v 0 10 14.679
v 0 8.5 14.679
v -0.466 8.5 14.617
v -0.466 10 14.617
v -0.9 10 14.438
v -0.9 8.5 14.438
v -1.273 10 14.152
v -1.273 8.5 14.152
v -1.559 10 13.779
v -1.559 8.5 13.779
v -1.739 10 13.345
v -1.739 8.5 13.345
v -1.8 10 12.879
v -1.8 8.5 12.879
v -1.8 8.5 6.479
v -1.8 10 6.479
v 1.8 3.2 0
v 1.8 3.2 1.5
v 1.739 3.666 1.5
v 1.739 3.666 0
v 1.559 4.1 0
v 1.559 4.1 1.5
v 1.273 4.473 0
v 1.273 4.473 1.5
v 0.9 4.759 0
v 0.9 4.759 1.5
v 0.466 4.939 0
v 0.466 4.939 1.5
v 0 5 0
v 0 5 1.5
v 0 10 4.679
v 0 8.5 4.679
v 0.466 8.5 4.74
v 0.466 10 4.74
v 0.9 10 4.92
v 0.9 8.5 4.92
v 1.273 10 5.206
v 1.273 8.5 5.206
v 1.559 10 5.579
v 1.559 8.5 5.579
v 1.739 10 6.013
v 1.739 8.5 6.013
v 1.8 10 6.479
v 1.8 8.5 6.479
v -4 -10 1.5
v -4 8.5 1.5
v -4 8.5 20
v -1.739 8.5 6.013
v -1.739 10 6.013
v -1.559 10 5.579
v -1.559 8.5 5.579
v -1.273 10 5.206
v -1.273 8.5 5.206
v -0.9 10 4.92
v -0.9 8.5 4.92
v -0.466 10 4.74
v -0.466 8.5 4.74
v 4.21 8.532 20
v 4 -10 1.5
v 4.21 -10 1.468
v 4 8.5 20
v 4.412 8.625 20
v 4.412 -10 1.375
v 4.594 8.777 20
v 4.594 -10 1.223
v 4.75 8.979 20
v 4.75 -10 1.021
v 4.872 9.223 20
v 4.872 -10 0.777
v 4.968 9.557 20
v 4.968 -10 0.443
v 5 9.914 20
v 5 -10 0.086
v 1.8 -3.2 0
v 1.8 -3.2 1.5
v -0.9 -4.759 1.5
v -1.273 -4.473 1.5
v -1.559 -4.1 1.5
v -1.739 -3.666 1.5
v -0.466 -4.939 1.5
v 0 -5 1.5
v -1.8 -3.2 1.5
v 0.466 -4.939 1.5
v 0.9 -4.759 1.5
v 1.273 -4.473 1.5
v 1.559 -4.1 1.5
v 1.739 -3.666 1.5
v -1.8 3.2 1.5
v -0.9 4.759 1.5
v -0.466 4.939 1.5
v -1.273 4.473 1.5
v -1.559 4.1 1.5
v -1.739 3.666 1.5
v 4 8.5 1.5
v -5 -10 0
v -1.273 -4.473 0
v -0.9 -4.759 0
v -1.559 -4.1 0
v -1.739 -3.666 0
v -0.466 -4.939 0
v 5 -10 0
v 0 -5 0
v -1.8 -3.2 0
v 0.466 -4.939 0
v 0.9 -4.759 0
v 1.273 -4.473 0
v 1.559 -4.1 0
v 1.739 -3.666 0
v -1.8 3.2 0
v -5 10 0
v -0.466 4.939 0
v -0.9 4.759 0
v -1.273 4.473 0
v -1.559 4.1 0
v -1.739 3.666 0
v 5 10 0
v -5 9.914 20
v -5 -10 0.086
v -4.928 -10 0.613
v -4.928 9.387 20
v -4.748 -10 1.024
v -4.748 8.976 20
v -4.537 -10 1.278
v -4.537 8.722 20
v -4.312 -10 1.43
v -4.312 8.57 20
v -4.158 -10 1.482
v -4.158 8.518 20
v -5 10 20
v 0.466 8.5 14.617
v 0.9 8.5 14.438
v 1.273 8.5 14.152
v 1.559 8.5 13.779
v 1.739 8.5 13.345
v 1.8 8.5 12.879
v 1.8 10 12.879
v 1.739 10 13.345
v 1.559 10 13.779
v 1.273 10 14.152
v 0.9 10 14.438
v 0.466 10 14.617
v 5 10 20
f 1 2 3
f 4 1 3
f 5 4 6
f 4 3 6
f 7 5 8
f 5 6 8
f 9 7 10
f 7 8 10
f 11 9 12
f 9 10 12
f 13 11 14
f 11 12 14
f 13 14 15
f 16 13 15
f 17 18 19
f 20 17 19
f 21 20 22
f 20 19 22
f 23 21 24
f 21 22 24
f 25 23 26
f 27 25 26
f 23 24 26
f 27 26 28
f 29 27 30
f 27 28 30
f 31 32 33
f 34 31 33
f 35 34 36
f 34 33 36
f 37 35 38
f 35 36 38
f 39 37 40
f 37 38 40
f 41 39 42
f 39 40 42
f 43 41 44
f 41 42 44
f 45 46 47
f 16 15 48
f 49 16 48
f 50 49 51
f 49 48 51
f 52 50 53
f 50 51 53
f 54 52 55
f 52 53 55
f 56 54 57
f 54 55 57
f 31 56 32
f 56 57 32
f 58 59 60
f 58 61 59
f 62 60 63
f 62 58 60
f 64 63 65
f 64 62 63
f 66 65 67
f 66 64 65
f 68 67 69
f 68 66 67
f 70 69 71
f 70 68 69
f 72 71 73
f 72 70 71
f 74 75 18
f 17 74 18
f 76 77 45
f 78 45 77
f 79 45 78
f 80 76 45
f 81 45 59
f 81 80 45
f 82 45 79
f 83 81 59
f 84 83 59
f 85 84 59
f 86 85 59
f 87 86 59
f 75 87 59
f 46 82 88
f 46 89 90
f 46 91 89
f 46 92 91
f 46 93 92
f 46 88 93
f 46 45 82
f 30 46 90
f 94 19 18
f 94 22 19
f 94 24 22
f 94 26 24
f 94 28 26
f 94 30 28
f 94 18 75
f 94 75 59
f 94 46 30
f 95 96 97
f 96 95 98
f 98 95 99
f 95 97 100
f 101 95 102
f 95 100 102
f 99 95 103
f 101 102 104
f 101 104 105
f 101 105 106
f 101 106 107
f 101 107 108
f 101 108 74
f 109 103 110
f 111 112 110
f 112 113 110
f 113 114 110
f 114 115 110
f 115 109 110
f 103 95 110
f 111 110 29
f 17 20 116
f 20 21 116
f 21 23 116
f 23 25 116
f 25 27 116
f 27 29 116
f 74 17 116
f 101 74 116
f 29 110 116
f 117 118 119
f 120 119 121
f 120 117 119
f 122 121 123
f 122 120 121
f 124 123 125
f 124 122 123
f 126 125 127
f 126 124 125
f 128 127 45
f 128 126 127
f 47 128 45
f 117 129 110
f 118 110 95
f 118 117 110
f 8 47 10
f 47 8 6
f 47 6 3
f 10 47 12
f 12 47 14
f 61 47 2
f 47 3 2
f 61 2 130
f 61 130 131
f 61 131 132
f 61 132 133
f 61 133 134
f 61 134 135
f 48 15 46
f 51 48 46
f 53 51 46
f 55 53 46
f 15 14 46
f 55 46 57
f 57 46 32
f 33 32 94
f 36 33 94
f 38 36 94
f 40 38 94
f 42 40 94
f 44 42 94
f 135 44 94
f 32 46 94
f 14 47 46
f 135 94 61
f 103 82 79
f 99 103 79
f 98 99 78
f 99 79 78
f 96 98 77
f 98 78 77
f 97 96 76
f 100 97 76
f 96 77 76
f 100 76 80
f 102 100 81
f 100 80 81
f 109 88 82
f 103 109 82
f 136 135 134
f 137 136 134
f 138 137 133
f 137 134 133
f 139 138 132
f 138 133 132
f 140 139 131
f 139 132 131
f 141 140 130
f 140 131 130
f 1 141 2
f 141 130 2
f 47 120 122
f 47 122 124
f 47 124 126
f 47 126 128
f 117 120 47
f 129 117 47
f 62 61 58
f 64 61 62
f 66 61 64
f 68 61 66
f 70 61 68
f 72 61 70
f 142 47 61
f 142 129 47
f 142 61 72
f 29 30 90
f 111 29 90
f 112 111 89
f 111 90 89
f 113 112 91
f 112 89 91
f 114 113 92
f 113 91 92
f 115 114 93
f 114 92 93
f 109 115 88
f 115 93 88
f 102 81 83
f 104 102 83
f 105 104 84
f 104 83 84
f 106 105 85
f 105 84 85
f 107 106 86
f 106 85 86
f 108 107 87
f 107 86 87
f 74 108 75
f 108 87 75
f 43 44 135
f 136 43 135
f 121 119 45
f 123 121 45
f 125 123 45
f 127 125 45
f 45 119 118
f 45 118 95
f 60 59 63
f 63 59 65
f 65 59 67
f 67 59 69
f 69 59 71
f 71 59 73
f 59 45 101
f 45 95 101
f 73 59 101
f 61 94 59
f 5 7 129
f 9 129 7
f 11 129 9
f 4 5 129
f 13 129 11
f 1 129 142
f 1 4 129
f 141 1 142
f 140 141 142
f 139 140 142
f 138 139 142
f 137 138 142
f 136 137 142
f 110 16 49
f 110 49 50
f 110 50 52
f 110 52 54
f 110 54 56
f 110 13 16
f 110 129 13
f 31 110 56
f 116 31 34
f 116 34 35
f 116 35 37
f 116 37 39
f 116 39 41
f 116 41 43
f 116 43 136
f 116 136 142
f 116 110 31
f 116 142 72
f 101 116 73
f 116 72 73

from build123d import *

# Parameters (mm, degrees)
F0_W     = 10
F0_H     = 20
F1_DEPTH = 1.5
F2_W     = 10
F2_H     = 1.5
F3_DEPTH = 18.5
F5_DEPTH = 1.501
F7_DEPTH = 1.501
F9_DEPTH = 1
F10_R    = 0.99999


# Not quite as in the source:
# - a fillet or chamfer is up to 0.001 mm smaller than in the source, because OpenCascade refuses the exact size
# - a pattern or mirror of a feature is missing from the dataset's text; its kind, count and spacing are read off the source's solid


with BuildPart() as f1:
    # F0 (on Top) → F1 (new body)
    with BuildSketch(Plane.XY):
        Rectangle(F0_W, F0_H)
    extrude(amount=F1_DEPTH)

    # F2 (on face) → F3 (join)
    with BuildSketch(Plane.XY.offset(1.5)):
        with Locations((0, 9.25)):
            Rectangle(F2_W, F2_H)
    extrude(amount=F3_DEPTH)

    # F4 (on face) → F5 (cut, through all)
    with BuildSketch(Plane.XY.offset(1.5)):
        with BuildLine():
            ThreePointArc((0, -5), (1.2727922061, -4.4727922061), (1.8, -3.2))
            Line((1.8, -3.2), (1.8, 3.2))
            ThreePointArc((1.8, 3.2), (1.2727922061, 4.4727922061), (0, 5))
            ThreePointArc((0, 5), (-1.2727922061, 4.4727922061), (-1.8, 3.2))
            Line((-1.8, 3.2), (-1.8, -3.2))
            ThreePointArc((-1.8, -3.2), (-1.2727922061, -4.4727922061), (0, -5))
        make_face()
    extrude(amount=-F5_DEPTH, mode=Mode.SUBTRACT)

    # F6 (on face) → F7 (cut, through all)
    with BuildSketch(Plane.XZ.offset(-8.5)):
        with BuildLine():
            ThreePointArc((0, 4.6788305809), (1.2727922061, 5.2060383747), (1.8, 6.4788305809))
            Line((1.8, 6.4788305809), (1.8, 12.8788305809))
            ThreePointArc((1.8, 12.8788305809), (1.2727922061, 14.151622787), (0, 14.6788305809))
            ThreePointArc((0, 14.6788305809), (-1.2727922061, 14.151622787), (-1.8, 12.8788305809))
            Line((-1.8, 12.8788305809), (-1.8, 6.4788305809))
            ThreePointArc((-1.8, 6.4788305809), (-1.2727922061, 5.2060383747), (0, 4.6788305809))
        make_face()
    extrude(amount=-F7_DEPTH, mode=Mode.SUBTRACT)

    # F8 (on face) → F9 (join)
    with BuildSketch(Plane(origin=(-5, 0, 0), x_dir=(0, -1, 0), z_dir=(-1, 0, 0))):
        Polygon((10, 1.5), (-8.5, 20), (-8.5, 1.5), align=None)
    f9 = extrude(amount=-F9_DEPTH)

    # F9_copies: F9 across plane
    add(f9.mirror(Plane(origin=(0, 0, 0), x_dir=(0, 0, 1), z_dir=(1, 0, 0))))

    # F10 (radius 1 in the source; OpenCascade refuses exactly that, so slightly less here)
    f10_edges = [f1.edges().sort_by_distance(p)[0] for p in [
        (-5, -0.75, 10.75),
        (5, -0.75, 10.75),
    ]]
    fillet(f10_edges, radius=F10_R)


solid = f1.part
